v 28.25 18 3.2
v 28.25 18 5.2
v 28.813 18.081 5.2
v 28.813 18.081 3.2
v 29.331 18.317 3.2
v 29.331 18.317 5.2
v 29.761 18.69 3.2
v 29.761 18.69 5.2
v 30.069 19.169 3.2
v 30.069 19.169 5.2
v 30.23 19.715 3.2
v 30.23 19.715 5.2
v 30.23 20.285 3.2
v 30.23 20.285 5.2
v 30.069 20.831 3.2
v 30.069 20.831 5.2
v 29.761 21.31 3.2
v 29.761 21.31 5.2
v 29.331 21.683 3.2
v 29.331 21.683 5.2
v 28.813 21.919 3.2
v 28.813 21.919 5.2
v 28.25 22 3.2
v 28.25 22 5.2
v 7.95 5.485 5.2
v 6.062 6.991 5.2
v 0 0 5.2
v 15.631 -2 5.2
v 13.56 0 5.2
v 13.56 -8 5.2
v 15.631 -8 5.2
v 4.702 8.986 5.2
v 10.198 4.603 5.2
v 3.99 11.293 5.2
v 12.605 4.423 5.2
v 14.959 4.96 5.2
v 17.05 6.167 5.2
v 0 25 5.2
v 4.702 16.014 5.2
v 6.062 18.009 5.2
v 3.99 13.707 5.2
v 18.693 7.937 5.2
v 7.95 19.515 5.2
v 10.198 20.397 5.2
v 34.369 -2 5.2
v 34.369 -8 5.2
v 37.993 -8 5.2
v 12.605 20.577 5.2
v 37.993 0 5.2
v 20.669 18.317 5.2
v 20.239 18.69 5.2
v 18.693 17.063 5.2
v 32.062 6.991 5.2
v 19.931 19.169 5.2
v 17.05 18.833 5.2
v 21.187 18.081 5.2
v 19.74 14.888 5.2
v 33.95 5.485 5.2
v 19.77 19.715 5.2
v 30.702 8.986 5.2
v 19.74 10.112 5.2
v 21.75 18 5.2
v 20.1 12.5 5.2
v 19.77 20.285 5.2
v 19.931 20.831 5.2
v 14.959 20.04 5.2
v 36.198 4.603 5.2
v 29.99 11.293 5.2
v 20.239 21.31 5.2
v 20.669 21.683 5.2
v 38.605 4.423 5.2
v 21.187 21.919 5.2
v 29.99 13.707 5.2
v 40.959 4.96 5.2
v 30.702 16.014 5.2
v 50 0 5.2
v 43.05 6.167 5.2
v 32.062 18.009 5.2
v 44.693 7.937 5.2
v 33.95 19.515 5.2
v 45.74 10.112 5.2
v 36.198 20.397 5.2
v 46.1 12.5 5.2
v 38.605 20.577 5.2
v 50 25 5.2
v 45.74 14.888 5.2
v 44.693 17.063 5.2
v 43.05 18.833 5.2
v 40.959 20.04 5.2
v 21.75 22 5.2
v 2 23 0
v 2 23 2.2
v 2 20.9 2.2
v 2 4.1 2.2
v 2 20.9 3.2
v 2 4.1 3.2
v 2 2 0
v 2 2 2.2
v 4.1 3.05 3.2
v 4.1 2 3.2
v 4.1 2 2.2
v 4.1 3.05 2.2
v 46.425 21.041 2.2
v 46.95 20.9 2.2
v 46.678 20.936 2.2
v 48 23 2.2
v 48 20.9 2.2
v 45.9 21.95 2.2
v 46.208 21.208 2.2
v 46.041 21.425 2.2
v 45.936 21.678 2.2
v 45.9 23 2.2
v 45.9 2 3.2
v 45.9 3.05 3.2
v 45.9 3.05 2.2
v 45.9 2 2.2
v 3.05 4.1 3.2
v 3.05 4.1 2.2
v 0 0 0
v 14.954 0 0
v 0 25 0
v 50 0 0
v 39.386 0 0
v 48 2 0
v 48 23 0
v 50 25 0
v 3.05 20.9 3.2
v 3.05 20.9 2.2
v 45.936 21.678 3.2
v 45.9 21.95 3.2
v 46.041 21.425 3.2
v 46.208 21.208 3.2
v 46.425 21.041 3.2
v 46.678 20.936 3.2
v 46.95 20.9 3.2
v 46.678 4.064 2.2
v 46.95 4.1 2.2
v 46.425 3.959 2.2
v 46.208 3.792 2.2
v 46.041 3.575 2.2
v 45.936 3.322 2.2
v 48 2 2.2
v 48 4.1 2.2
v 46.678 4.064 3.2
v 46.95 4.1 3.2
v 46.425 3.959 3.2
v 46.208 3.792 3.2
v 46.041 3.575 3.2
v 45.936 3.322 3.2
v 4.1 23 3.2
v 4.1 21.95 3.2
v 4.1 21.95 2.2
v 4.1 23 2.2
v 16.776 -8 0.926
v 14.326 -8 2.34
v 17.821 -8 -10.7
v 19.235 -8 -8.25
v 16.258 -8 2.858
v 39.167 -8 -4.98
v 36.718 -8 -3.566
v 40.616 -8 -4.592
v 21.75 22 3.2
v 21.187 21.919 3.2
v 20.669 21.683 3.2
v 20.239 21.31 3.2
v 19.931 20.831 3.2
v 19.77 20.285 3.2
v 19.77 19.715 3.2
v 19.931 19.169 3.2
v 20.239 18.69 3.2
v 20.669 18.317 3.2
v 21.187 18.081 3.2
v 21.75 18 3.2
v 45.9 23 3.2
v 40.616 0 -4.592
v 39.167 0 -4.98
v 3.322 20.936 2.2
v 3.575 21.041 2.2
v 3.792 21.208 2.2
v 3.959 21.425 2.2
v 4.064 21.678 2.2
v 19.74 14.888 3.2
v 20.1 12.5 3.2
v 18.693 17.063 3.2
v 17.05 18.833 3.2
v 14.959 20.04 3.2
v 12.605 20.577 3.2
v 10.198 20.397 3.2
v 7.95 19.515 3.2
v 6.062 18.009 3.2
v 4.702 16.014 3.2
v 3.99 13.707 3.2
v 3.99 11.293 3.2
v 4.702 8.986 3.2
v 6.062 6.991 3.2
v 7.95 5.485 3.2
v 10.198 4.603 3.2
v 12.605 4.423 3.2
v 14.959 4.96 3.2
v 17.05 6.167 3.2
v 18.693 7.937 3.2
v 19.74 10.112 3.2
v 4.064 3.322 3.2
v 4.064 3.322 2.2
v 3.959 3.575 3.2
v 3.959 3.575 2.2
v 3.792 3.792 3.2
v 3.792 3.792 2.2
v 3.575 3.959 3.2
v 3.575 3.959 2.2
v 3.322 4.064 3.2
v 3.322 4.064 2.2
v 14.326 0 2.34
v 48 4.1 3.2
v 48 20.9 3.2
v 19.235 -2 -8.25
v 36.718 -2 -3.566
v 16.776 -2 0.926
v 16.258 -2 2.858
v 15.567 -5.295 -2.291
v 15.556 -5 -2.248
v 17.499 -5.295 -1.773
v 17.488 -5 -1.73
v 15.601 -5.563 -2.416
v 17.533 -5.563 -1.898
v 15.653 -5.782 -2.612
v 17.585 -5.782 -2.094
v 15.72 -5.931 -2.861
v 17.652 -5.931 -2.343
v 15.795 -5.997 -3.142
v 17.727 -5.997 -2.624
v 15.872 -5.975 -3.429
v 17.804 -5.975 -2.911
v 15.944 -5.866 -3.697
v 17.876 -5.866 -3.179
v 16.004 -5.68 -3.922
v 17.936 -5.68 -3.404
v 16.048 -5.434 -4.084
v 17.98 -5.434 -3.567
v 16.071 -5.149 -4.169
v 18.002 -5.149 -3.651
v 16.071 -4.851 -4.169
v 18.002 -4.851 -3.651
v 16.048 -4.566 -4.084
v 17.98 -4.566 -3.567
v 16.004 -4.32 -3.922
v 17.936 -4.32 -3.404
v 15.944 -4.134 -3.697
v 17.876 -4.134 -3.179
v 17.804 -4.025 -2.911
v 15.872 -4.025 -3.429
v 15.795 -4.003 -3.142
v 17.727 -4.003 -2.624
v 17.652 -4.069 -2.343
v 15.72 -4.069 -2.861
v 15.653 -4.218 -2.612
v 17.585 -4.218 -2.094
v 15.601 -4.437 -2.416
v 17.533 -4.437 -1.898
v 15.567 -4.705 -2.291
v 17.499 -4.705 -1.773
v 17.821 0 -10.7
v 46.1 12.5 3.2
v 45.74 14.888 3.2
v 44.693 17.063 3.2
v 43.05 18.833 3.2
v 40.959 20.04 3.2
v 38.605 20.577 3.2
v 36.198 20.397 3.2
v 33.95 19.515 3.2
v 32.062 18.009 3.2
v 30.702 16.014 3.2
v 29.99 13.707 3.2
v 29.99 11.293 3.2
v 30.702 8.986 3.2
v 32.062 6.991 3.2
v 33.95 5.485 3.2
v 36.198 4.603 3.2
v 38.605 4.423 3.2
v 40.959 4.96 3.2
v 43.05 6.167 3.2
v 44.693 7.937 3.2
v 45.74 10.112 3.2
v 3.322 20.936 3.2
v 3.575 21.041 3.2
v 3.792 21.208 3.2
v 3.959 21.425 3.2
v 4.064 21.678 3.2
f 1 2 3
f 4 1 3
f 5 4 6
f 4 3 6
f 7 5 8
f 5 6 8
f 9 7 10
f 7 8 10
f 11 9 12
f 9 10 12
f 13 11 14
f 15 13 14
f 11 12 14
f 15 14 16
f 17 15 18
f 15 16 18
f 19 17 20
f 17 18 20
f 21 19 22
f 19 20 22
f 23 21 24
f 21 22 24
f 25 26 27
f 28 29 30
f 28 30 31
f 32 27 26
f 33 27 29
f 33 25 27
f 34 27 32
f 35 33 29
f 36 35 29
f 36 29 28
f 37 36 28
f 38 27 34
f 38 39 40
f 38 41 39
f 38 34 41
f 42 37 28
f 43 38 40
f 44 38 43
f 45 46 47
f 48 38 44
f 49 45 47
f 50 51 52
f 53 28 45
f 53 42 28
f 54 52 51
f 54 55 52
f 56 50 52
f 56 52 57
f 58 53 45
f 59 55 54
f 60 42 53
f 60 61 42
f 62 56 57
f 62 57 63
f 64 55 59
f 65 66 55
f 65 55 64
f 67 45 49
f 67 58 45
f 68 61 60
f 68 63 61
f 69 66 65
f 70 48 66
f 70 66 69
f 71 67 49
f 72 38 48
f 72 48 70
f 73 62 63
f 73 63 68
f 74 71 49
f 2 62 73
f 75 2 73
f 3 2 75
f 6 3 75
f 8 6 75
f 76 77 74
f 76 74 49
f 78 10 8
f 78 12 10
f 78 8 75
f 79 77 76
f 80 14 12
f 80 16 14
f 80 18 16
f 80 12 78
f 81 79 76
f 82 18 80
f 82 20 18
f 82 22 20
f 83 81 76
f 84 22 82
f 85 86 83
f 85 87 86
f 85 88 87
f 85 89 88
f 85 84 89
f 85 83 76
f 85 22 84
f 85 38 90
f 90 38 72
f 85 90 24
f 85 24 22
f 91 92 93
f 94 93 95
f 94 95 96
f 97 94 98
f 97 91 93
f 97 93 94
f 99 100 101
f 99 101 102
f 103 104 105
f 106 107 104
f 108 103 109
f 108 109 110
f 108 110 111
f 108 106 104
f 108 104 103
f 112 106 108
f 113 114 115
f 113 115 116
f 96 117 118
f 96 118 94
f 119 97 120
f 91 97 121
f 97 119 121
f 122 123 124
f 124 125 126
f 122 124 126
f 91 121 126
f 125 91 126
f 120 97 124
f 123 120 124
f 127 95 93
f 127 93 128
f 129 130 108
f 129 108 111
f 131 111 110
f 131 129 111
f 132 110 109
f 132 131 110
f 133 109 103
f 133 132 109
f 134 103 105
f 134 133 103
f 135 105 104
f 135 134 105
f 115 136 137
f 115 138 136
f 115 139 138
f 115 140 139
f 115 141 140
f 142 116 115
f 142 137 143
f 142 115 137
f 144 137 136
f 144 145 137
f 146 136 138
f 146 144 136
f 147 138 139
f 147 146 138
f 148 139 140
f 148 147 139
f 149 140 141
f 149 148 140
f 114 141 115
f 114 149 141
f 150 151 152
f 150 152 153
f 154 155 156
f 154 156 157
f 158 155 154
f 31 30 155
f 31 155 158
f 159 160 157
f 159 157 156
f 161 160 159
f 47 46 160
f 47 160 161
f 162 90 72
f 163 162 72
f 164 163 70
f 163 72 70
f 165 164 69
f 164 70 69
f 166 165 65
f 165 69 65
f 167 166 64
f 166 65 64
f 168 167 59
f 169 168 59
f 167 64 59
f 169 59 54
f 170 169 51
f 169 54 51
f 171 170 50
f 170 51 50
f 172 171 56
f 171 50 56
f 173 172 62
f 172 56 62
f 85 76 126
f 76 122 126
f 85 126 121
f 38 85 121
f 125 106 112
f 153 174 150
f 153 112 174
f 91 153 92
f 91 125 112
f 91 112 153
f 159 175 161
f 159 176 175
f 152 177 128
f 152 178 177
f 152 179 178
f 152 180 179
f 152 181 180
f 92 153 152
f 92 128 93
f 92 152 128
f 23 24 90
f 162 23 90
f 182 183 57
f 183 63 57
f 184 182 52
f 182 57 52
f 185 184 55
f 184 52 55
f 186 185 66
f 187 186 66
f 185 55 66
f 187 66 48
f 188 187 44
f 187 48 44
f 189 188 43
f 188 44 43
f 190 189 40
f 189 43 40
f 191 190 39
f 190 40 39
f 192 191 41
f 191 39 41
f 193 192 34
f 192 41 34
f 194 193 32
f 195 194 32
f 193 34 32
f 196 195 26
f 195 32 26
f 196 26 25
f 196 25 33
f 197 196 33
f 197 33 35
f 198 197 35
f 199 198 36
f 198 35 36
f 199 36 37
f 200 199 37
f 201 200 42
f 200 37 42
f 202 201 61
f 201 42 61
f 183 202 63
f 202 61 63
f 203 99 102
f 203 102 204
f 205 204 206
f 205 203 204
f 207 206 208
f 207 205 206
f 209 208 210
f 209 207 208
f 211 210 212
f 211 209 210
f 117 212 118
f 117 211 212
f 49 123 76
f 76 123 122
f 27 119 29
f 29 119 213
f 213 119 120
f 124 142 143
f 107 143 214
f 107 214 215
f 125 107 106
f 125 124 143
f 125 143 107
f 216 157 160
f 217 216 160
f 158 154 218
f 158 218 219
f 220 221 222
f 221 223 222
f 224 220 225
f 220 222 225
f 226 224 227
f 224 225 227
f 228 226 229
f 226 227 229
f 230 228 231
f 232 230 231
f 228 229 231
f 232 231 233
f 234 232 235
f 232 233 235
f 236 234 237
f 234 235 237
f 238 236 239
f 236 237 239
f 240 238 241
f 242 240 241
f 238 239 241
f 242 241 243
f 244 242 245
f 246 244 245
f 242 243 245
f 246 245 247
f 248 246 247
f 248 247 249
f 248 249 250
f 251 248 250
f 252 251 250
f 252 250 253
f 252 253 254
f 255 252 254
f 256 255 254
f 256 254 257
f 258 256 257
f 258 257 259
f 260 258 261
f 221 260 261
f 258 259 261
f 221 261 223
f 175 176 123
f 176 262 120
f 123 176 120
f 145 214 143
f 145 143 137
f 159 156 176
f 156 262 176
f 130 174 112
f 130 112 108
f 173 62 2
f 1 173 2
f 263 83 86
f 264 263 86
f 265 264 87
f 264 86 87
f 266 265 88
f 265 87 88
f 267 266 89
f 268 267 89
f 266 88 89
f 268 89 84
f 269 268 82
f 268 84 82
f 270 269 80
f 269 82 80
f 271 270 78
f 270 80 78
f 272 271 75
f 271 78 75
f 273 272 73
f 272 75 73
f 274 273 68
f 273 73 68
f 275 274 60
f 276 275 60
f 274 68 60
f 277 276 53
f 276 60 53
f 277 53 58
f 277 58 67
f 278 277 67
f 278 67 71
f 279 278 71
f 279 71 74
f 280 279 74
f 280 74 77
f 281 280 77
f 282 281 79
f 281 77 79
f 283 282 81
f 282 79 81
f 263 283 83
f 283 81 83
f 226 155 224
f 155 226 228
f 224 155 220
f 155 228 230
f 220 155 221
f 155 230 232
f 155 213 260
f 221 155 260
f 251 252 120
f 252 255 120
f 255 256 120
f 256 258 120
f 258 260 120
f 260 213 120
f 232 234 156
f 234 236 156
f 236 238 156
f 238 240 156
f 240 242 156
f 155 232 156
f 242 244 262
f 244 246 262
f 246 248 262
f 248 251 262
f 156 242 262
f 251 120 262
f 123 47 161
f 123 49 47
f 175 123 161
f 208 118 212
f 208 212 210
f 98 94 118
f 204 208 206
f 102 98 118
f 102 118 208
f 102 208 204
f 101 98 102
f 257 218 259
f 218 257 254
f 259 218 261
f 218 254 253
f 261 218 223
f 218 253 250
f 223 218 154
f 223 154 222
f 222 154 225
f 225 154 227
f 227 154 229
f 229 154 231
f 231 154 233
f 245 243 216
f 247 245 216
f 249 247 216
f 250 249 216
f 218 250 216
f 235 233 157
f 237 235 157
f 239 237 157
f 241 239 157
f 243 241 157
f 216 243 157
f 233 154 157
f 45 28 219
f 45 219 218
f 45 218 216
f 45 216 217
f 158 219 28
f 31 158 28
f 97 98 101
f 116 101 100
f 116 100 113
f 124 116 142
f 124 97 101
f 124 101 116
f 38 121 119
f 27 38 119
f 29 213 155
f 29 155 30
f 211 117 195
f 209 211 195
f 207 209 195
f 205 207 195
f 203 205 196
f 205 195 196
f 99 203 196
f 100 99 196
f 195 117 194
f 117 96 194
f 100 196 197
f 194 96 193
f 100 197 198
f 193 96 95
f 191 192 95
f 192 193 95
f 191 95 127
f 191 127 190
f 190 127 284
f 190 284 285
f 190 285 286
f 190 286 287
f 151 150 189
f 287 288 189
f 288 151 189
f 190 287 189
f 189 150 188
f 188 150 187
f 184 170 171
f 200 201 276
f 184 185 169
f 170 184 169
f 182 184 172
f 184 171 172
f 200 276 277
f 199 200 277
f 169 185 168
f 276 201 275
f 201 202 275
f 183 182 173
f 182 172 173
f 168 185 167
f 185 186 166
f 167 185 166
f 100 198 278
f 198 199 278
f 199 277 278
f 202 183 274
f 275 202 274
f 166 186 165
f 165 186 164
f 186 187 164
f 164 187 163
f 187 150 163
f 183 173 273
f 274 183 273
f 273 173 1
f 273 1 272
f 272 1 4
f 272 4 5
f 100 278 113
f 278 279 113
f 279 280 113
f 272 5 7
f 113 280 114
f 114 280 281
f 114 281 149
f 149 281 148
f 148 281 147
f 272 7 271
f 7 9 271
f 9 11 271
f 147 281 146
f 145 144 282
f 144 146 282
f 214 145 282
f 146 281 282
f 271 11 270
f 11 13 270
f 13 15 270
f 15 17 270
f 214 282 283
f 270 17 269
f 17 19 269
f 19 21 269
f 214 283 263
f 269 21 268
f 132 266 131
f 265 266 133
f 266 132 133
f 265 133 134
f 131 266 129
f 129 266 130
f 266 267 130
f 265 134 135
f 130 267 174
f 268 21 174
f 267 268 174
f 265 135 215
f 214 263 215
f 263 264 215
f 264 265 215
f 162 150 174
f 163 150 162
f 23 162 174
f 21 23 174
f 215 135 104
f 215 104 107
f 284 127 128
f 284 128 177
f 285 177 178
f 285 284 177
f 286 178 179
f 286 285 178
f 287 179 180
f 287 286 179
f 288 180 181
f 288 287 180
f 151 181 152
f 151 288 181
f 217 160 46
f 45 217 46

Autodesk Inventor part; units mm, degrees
ref_plane "YZ Plane" through (0, 0, 0) normal (1, 0, 0) x (0, 1, 0)
sketch "Эскиз1" plane through (0, 0, 0) normal (0, 0, 1) x (1, 0, 0)
  line L0 (0, 0) -> (50, 0)
  line L1 (50, 0) -> (50, 25)
  line L2 (50, 25) -> (0, 25)
  line L3 (0, 25) -> (0, 0)
  dimension "d0" = 50
  dimension "d1" = 25
extrude "Выдавливание1" add sketch "Эскиз1" along normal blind 5.2
shell "Оболочка1" thickness 2 removed faces 1 at (16.6667, 16.6667, 0)
sketch "Эскиз2" plane through (0, 0, 5.2) normal (0, 0, 1) x (1, 0, 0)
  line L0 (50, 25) -> (0, 25) projected
  line L1 (25, 25) -> (25, 0)
  line L2 (0, 0) -> (50, 0) projected
  line L3 (25, 12.5) -> (12, 12.5)
  line L4 (0, 25) -> (0, 0) projected
  circle A0 centre (12, 12.5) radius 8.1
  circle A1 centre (38, 12.5) radius 8.1
  line L5 (25, 25) -> (25, 20)
  line L6 (21.75, 20) -> (28.25, 20) construction
  line L7 (21.75, 18) -> (28.25, 18)
  line L8 (28.25, 22) -> (21.75, 22)
  arc A2 (21.75, 22) -> (21.75, 18) centre (21.75, 20) ccw
  arc A3 (28.25, 18) -> (28.25, 22) centre (28.25, 20) ccw
  point P0 (25, 18)
  point P1 (25, 22)
  dimension "d5" = 13
  dimension "d6" = 16.2
  dimension "d9" = 5
  dimension "d10" = 3.25
  dimension "d11" = 4
extrude "Выдавливание2" cut sketch "Эскиз2" against normal through all contours L8 A3 L7 L1 | L1 L7 A2 L8 | A0 | A1
sketch "Эскиз5" plane through (48, 23, 3.2) normal (0, 0, -1) x (-1, 0, 0)
  line L0 (0, 0) -> (1.05, 0)
  line L1 (0, 0) -> (46, 0) projected
  line L2 (1.05, 0) -> (1.05, -1.05)
  circle A0 centre (1.05, -1.05) radius 1.05
  line L3 (2.1, -2.1) -> (0, -2.1)
  line L4 (0, -2.1) -> (0, 0)
  line L5 (0, 0) -> (2.1, 0)
  line L6 (2.1, 0) -> (2.1, -2.1)
  line L7 (2.1, -2.1) -> (0, 0) construction
  line L8 (0, -2.1) -> (2.1, 0) construction
  point P0 (48, -23)
  point P1 (1.05, -2.1)
  point P2 (2.1, -1.05)
  dimension "d17" = 1.05
  dimension "d18" = 1.05
extrude "Выдавливание4" add sketch "Эскиз5" along normal blind 1 contours L0 A0 L4 | L1 L6 A0 | A0 | A0 L3 L4
ref_plane "РабПлоскость1" through (25, 2, 0) normal (1, 0, 0) x (0, 0, -1)
ref_plane "РабПлоскость2" through (2, 12.5, 0) normal (0, -1, 0) x (1, 0, 0)
mirror "Зеркальное отражение1" about plane through (2, 12.5, 0) normal (0, -1, 0) of "Выдавливание4"
mirror "Зеркальное отражение2" about plane through (25, 2, 0) normal (1, 0, 0) of "Выдавливание4", "Зеркальное отражение1"
sketch "Эскиз14" plane through (0, 0, 0) normal (0, -1, 0) x (1, 0, 0)
  line L0 (35.6735, 8.06) -> (14.3265, 2.34)
  line L1 (14.3265, 2.34) -> (17.8206, -10.6999)
  line L2 (17.8206, -10.6999) -> (39.1675, -4.98)
  line L3 (39.1675, -4.98) -> (35.6735, 8.06)
  line L4 (35.6735, 8.06) -> (17.8206, -10.6999) construction
  line L5 (14.3265, 2.34) -> (39.1675, -4.98) construction
  line L6 (0, 5.2) -> (50, 5.2) projected
  point P0 (0, 0)
  point P1 (26.747, -1.32)
  point P2 (25, 5.2)
  dimension "d67" = 13.5
  dimension "d68" = 22.1
  dimension "d77" = 15
extrude "Выдавливание10" add sketch "Эскиз14" along normal blind 8
sketch "Эскиз15" plane through (0, -8, 0) normal (0, -1, 0) x (1, 0, 0)
  line L0 (17.8206, -10.6999) -> (39.1675, -4.98) projected
  line L1 (19.2348, -8.2505) -> (36.718, -3.5658)
  line L2 (36.718, -3.5658) -> (34.2593, 5.6105)
  line L3 (34.2593, 5.6105) -> (16.776, 0.9258)
  line L4 (16.776, 0.9258) -> (19.2348, -8.2505)
  line L5 (39.1675, -4.98) -> (35.6735, 8.06) projected
  line L6 (17.8206, -10.6999) -> (39.1675, -4.98) projected
  line L7 (35.6735, 8.06) -> (14.3265, 2.34) projected
  line L8 (39.1675, -4.98) -> (14.3265, 2.34) construction
  line L9 (17.8206, -10.6999) -> (35.6735, 8.06) construction
  line L10 (19.2348, -8.2505) -> (34.2593, 5.6105) construction
  line L11 (16.776, 0.9258) -> (36.718, -3.5658) construction
  line L12 (34.2593, 5.6105) -> (33.7416, 7.5423)
  line L13 (16.776, 0.9258) -> (16.2584, 2.8577)
  point P0 (0, 0)
  point P1 (26.747, -1.32)
  dimension "d78" = 2
  dimension "d79" = 2
extrude "Выдавливание11" cut sketch "Эскиз15" against normal blind 6
sketch "Эскиз16" plane through (37.8331, 0, 0) normal (0.9659258, 0, 0.258819) x (0.258819, 0, -0.9659258)
  line L0 (5.1557, 0) -> (0, 0) projected
  line L1 (-5.3834, 0) -> (0, 0) projected
  line L2 (-8.3443, 0) -> (-8.3443, -8) projected
  line L3 (5.1557, -8) -> (-8.3443, -8) projected
  line L4 (5.1557, 0) -> (5.1557, -8) projected
  line L5 (-5.3834, 0) -> (-8.3443, 0) projected
  point P0 (-9.7919, 0)
extrude "Выдавливание12" add sketch "Эскиз16" along normal blind 1.5
sketch "Эскиз17" plane through (17.8206, -8, -10.6999) normal (-0.9659258, 0, -0.258819) x (-0.258819, 0, 0.9659258)
  line L0 (2, 0) -> (13.5, 0) projected
  line L1 (2, 0) -> (2, 6) projected
  line L2 (2, 6) -> (13.5, 6) projected
  line L3 (13.5, 0) -> (13.5, 6) projected
  line L4 (7.75, 6) -> (7.75, 0)
  line L5 (13.5, 0) -> (0, 0) projected
  point P0 (14.9477, 8)
  point P1 (7.75, 3)
hole "Отверстие4" at (15.8147, -5, -3.214) direction (0.9659258, 0, 0.258819) diameter 2 depth 2
sketch "Эскиз18" plane through (0, 0, 0) normal (0, 1, 0) x (1, 0, 0)
  line L0 (25, -5.2) -> (37.9927, -5.2) projected
  line L1 (25, -5.2) -> (37.1224, -8.4482) projected
  line L2 (37.9927, -5.2) -> (37.1224, -8.4482) projected
  point P0 (0, 0)
extrude "Выдавливание13" cut sketch "Эскиз18" against normal through all
sketch "Эскиз19" plane through (0, 0, 0) normal (0, -1, 0) x (1, 0, 0)
  line L0 (14.3265, 2.34) -> (25, 5.2) projected
  line L1 (14.3265, 2.34) -> (13.5602, 5.2)
  line L2 (0, 5.2) -> (25, 5.2) projected
  line L3 (14.3265, 2.34) -> (17.8206, -10.6999) projected
  line L4 (16.2584, 2.8577) -> (14.3265, 2.34) projected
  line L5 (16.2584, 2.8577) -> (15.6308, 5.2)
  line L6 (50, 5.2) -> (0, 5.2) projected
  line L7 (19.2348, -8.2505) -> (16.2584, 2.8577) projected
  point P0 (0, 0)
extrude "Выдавливание14" add sketch "Эскиз19" along normal up to surface (8 mm away) contours L1 L2 L5 L0
sketch "Эскиз21" plane through (15.6308, 0, 5.2) normal (0, -1, 0) x (1, 0, 0)
  line L0 (0, 0) -> (0.6276, -2.3423) projected
  line L1 (0.6276, -2.3423) -> (9.3692, 0) projected
  line L2 (0, 0) -> (9.3692, 0) projected
  point P0 (-15.6308, -5.2)
extrude "Выдавливание15" add sketch "Эскиз21" along normal up to surface (2 mm away)
properties part number "Крепление ультрасоника вертикальная"
